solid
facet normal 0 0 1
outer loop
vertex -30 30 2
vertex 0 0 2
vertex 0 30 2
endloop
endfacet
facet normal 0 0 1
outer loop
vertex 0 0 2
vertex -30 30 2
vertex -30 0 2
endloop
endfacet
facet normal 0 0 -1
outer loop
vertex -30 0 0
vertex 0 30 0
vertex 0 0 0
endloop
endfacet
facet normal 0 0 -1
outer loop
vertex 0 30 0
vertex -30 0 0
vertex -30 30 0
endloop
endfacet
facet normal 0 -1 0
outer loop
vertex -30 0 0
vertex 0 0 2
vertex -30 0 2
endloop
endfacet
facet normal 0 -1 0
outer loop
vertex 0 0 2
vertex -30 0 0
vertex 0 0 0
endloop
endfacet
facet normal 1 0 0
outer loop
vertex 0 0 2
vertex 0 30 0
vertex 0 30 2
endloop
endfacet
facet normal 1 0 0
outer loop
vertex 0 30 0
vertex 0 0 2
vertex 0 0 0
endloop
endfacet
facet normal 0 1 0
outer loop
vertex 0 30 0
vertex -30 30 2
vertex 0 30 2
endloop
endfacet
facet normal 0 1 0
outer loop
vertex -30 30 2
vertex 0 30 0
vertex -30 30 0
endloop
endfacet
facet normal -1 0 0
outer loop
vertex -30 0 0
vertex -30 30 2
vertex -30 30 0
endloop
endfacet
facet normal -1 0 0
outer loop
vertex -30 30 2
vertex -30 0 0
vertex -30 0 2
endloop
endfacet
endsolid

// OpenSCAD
// Library pulled in via `include <>`: definitions AND top-level geometry
// become part of the including file.
plate_w = 30;
plate_h = 2;

module plate() {
    cube([plate_w, plate_w, plate_h]);
}

// Top-level geometry: `include` executes this, `use` would not.
translate([-plate_w, 0, 0]) plate();
